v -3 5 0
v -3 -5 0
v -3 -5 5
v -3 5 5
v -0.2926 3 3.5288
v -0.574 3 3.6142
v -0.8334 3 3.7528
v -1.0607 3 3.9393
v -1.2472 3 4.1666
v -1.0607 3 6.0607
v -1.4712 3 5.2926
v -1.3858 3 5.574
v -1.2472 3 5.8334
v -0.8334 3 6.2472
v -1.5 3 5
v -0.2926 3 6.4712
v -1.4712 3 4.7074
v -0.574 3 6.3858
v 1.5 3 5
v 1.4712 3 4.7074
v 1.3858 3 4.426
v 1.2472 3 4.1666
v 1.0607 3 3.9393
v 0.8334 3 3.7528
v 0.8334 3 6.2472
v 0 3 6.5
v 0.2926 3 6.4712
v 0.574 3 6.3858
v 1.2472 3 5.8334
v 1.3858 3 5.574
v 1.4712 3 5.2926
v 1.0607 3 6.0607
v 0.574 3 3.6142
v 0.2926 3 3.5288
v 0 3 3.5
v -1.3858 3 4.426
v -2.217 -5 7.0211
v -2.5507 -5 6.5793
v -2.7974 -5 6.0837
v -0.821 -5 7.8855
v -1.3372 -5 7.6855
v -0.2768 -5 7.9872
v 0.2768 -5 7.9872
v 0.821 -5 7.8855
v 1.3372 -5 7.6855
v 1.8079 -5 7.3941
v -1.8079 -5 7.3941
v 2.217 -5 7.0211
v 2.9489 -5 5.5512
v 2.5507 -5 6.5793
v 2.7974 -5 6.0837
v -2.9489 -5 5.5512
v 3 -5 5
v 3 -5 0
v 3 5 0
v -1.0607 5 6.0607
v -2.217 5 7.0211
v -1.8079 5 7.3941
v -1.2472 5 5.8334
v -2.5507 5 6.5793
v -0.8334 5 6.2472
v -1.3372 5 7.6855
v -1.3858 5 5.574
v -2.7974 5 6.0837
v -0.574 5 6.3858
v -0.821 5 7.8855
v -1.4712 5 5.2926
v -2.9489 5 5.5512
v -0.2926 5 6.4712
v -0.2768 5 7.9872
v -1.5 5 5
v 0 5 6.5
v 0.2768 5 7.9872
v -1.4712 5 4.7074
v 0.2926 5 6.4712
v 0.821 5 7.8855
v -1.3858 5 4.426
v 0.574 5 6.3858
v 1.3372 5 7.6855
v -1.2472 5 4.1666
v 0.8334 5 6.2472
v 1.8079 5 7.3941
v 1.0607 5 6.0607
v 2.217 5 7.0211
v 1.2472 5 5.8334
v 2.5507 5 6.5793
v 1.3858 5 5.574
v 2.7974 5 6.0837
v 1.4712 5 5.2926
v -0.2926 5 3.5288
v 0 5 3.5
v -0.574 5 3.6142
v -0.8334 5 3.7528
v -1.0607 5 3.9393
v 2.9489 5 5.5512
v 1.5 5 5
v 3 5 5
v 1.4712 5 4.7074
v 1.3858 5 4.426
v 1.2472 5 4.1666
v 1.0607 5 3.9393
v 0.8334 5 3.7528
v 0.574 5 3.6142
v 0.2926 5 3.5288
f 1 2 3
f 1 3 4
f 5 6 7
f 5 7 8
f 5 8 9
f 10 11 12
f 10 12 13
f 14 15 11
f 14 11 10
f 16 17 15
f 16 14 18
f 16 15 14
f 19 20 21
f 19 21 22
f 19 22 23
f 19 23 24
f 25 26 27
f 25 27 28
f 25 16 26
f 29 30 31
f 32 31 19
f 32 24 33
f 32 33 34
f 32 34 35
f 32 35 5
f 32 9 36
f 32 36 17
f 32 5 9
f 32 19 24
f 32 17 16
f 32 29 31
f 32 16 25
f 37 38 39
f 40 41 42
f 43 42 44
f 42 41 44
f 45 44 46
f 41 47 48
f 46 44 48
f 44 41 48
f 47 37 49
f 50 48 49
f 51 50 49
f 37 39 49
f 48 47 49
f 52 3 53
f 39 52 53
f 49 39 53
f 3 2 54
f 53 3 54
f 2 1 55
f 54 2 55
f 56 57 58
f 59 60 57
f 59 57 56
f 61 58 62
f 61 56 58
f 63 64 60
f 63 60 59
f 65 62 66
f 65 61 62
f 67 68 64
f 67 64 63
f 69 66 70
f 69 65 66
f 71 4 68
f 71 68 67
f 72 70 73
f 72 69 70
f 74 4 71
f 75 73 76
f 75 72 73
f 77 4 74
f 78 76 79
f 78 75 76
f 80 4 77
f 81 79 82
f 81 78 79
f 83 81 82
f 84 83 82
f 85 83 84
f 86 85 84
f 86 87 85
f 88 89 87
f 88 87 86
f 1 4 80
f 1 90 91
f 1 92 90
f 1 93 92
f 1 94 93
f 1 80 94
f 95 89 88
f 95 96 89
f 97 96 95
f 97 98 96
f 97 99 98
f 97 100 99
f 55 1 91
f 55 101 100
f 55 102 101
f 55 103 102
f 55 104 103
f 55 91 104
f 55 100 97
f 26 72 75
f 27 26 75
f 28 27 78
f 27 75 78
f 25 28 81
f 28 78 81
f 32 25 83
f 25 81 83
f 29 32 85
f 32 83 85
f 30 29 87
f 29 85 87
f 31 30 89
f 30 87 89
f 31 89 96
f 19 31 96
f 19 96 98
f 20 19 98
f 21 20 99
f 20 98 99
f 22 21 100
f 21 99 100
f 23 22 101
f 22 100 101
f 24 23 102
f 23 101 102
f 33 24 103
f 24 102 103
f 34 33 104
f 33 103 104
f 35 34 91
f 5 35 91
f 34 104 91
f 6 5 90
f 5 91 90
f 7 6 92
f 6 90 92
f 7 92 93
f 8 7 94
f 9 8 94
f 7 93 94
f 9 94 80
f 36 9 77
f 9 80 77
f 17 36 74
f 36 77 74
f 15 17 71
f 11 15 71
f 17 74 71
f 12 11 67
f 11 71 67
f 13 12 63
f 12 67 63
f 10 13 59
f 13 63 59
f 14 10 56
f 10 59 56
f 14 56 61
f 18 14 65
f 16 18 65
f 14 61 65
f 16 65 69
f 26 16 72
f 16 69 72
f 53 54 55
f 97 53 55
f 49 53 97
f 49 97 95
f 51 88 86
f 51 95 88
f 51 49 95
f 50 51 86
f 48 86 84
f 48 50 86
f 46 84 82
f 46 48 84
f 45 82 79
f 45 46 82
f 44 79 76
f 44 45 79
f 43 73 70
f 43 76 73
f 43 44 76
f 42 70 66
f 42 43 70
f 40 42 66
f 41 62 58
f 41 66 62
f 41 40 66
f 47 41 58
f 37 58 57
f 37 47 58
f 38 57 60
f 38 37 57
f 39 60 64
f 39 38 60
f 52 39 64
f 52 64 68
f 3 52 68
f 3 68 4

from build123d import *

# Parameters (mm, degrees)
SKETCH1_W           = 6
SKETCH1_H           = 10
BOSS_EXTRUDE1_DEPTH = 8
FILLET2_RADIUS      = 3
FILLET2_LENGTH      = 10
SKETCH2_R           = 1.5
CUT_EXTRUDE1_DEPTH  = 2


with BuildPart() as part:
    # Sketch1 → Boss-Extrude1 (new body)
    with BuildSketch(Plane.XY):
        Rectangle(SKETCH1_W, SKETCH1_H)
    extrude(amount=BOSS_EXTRUDE1_DEPTH)

    # Fillet2: full round fillet: the end face becomes a half cylinder, R = half its width
    fillet2_face = Plane((0, 0, 8), x_dir=(0, -1, 0), z_dir=(0, 0, 1))  # on the end face: x along it, z out of the body
    fillet2_slab = fillet2_face.offset(-FILLET2_RADIUS / 2) * Box(FILLET2_LENGTH, 2 * FILLET2_RADIUS, FILLET2_RADIUS, mode=Mode.PRIVATE)  # the body's end, R deep
    fillet2_round = Plane((0, 0, 5), x_dir=(0, 0, 1), z_dir=(0, -1, 0)) * Cylinder(FILLET2_RADIUS, FILLET2_LENGTH, mode=Mode.PRIVATE)  # its axis R under the face
    add(fillet2_slab - fillet2_round, mode=Mode.SUBTRACT)

    # Sketch2 → Cut-Extrude1 (cut)
    with BuildSketch(Plane(origin=(0, 5, 0), x_dir=(1, 0, 0), z_dir=(0, 1, 0))):
        with Locations(Location((0, -5, 0), (0, 0, 270))):
            Circle(SKETCH2_R)
    extrude(amount=-CUT_EXTRUDE1_DEPTH, mode=Mode.SUBTRACT)


solid = part.part
